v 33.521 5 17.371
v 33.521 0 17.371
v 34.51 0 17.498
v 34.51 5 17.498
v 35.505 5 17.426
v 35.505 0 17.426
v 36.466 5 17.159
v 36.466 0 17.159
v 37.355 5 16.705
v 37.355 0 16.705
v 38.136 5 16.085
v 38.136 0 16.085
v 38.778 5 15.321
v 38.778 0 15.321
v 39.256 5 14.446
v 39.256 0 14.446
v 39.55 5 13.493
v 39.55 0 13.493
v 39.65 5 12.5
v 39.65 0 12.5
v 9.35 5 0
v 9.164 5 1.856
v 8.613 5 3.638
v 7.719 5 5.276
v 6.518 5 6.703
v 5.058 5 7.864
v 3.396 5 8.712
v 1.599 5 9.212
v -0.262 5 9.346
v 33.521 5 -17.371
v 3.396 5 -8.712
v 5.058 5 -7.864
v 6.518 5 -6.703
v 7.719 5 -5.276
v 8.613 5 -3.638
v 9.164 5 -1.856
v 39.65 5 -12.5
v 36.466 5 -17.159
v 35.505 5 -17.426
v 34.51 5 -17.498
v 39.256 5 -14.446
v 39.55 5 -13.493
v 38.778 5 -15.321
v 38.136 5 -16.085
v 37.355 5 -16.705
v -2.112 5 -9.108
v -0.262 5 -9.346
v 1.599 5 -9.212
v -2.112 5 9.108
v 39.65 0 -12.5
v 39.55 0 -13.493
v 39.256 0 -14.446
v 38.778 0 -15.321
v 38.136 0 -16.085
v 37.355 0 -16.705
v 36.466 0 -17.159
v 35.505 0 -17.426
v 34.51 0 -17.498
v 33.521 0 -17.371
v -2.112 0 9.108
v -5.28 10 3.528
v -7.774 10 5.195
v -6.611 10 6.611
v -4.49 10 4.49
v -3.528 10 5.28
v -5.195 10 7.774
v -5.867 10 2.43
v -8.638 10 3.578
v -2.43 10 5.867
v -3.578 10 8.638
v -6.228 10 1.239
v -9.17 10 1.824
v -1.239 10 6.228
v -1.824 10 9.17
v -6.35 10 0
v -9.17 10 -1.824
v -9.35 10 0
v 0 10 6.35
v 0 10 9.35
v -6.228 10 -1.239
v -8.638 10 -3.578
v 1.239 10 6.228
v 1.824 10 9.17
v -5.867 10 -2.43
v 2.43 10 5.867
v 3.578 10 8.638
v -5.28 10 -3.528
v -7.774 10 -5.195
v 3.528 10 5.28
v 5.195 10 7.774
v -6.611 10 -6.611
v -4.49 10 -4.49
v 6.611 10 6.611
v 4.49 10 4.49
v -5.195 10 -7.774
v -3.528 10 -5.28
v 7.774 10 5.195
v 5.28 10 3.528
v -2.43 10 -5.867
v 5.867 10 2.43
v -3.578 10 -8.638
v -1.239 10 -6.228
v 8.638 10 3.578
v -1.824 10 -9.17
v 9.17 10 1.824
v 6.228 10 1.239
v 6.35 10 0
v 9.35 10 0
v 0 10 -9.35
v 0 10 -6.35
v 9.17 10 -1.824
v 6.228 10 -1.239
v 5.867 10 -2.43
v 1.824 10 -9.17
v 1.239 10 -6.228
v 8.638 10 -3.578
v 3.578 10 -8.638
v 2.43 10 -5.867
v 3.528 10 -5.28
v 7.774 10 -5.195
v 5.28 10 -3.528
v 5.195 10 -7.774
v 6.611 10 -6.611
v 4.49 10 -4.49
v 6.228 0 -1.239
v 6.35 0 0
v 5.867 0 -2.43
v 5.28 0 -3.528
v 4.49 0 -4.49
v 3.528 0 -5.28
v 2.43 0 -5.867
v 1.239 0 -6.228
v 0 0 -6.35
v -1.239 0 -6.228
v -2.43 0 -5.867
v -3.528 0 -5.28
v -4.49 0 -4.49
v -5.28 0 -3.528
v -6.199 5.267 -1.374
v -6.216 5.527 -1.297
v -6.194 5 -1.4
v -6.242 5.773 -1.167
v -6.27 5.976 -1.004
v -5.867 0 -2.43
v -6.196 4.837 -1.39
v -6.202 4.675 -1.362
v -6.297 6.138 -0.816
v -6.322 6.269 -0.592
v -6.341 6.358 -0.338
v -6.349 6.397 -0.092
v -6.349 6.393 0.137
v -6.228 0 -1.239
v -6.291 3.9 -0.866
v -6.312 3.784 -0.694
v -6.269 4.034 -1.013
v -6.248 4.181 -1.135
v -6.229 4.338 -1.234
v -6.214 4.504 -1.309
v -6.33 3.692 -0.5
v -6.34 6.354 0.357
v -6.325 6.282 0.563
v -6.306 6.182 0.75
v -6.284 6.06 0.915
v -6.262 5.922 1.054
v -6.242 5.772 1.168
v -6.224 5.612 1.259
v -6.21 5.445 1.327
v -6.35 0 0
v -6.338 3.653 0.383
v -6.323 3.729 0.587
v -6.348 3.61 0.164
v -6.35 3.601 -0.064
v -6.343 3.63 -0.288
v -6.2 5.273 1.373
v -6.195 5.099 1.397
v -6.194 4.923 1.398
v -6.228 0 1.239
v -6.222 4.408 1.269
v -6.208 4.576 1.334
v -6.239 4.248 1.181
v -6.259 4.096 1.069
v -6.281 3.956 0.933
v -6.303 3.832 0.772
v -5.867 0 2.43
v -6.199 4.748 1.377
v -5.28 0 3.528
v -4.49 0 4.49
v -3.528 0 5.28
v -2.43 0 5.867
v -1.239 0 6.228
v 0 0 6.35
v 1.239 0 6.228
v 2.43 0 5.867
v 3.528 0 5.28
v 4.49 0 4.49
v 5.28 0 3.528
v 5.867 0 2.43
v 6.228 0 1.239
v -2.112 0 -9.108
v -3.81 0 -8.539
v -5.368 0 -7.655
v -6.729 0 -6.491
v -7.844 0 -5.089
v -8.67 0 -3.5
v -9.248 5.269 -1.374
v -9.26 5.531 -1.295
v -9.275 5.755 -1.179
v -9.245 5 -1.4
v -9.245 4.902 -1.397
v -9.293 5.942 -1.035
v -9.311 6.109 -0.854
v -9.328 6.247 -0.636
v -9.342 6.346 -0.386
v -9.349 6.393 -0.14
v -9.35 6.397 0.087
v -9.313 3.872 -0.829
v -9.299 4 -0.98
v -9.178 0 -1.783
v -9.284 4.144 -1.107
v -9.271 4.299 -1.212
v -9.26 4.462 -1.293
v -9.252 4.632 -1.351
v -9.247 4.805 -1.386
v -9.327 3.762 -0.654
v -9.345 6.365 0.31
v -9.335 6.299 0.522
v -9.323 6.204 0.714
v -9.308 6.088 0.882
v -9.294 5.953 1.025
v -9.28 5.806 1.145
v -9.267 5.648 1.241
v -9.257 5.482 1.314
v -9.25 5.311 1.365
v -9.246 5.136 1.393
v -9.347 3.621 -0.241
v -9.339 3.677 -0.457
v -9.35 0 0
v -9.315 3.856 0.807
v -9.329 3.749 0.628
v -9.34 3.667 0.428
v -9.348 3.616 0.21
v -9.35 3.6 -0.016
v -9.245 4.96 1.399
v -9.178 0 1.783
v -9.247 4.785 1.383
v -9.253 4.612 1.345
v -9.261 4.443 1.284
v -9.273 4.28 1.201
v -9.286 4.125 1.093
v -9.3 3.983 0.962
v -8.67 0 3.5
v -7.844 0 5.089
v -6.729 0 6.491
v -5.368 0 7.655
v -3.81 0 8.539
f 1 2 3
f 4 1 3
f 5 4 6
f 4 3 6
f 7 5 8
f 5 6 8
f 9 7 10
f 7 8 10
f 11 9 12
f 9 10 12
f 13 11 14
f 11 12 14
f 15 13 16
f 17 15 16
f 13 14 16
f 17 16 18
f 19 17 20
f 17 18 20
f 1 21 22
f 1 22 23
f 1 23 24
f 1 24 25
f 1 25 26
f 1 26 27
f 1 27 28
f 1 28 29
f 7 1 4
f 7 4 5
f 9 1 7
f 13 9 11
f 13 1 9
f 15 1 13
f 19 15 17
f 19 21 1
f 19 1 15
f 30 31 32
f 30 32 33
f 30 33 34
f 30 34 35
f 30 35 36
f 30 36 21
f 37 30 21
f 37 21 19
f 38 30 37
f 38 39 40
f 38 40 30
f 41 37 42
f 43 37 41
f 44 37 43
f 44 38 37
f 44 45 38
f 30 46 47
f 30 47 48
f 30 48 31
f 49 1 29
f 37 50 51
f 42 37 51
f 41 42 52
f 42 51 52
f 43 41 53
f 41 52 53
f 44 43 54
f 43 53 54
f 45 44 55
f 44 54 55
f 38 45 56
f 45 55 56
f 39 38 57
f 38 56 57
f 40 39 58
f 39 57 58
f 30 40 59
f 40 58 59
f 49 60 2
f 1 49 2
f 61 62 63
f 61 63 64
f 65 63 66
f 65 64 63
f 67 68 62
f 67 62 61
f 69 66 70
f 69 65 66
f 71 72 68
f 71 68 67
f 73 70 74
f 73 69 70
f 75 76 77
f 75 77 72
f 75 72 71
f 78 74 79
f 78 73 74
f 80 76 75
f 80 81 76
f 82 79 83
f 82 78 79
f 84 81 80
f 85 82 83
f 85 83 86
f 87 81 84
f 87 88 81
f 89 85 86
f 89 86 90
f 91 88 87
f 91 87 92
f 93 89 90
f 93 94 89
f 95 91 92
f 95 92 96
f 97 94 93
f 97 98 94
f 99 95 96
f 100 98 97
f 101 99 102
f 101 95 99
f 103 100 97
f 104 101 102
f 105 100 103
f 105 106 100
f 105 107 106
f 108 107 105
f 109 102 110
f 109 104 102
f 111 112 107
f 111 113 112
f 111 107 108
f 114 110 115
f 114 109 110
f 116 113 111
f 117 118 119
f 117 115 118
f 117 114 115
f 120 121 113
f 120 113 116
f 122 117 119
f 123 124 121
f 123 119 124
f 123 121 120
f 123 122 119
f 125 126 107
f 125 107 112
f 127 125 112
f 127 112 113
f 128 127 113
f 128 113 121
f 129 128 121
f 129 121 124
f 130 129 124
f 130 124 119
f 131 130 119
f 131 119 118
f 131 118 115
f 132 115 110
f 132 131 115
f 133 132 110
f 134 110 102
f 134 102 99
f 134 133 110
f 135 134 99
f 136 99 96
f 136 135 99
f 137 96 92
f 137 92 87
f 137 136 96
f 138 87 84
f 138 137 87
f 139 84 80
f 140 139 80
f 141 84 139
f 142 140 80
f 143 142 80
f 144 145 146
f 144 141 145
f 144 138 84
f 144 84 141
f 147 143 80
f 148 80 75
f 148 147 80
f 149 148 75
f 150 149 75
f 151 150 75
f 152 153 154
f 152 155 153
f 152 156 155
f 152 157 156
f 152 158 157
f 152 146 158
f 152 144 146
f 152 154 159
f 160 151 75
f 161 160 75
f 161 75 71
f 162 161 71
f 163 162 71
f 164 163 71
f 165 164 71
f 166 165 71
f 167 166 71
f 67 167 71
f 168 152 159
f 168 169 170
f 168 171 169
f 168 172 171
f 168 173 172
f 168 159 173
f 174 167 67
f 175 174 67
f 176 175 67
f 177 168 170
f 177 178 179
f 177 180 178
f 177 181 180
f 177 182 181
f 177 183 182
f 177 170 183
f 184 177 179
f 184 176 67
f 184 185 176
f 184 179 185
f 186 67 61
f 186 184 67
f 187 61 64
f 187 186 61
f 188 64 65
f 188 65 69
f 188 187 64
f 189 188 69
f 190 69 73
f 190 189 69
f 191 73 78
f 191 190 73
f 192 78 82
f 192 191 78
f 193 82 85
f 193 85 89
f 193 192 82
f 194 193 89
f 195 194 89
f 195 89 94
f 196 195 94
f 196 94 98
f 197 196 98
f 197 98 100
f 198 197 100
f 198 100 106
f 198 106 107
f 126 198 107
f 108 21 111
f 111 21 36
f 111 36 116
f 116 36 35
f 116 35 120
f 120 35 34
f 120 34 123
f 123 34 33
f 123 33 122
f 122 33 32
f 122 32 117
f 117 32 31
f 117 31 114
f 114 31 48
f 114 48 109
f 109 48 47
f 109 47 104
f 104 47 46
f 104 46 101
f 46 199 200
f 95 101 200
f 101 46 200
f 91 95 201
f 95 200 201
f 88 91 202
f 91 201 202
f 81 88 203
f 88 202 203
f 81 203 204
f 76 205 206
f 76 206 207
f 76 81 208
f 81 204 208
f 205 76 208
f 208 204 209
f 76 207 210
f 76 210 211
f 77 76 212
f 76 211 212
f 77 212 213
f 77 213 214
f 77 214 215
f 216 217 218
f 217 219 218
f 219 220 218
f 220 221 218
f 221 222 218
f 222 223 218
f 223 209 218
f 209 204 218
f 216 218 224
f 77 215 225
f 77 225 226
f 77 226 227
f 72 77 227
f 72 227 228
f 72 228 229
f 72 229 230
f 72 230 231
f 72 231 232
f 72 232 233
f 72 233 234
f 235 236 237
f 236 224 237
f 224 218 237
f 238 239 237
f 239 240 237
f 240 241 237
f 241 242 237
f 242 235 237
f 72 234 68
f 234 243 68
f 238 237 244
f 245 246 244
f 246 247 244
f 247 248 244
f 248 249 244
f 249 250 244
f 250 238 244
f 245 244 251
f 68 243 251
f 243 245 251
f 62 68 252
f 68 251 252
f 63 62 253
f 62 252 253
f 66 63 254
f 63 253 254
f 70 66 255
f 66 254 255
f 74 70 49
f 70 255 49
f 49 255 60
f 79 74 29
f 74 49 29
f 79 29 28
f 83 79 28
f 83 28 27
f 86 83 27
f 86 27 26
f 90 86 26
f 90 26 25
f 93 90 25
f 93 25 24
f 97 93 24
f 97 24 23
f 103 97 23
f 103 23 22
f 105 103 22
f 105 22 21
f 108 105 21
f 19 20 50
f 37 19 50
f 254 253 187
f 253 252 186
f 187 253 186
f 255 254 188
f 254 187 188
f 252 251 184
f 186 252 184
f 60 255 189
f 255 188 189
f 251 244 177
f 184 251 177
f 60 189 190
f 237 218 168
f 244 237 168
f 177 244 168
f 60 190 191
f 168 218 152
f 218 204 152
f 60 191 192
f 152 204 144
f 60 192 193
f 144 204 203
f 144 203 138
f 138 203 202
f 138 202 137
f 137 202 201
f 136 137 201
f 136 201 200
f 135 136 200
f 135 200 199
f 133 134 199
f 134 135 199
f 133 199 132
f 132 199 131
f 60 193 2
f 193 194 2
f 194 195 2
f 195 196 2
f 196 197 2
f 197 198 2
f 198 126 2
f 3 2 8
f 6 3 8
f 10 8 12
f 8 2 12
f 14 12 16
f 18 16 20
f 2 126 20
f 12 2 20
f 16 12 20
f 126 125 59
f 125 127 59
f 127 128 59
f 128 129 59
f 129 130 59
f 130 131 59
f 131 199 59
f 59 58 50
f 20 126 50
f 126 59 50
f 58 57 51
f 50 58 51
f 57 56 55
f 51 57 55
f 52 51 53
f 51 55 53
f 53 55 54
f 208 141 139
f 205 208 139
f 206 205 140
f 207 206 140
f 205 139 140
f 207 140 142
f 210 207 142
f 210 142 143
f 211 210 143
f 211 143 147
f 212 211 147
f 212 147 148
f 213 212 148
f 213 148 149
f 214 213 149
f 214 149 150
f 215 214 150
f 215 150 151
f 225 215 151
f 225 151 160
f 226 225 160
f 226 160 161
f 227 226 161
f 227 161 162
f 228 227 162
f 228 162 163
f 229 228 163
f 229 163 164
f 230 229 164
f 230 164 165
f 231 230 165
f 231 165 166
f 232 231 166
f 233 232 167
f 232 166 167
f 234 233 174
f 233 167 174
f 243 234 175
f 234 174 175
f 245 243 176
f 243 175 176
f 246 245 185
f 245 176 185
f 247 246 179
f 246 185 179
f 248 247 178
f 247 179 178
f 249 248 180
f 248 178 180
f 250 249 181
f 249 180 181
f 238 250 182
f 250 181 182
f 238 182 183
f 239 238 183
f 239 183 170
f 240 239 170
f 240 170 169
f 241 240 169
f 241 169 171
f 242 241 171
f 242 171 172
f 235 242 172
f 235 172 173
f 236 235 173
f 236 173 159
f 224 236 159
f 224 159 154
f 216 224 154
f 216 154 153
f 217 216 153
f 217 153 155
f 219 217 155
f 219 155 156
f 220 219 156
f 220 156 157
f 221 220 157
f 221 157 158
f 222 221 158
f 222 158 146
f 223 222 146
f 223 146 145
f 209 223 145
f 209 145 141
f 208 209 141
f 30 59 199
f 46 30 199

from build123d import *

# Parameters (mm, degrees)
SKETCH1_R           = 6.35
BOSS_EXTRUDE1_DEPTH = 5
SKETCH1_3_R         = 6.35
BOSS_EXTRUDE2_DEPTH = 10
SKETCH2_R           = 1.4
CUT_EXTRUDE1_DEPTH  = 45.478899492


with BuildPart() as part:
    # Sketch1 → Boss-Extrude1 (new body)
    with BuildSketch(Plane(origin=(0, 0, 0), x_dir=(1, 0, 0), z_dir=(0, 1, 0))):
        with BuildLine():
            Line((33.520573743, 17.370769583), (-2.1120271, 9.10833912))
            ThreePointArc((-2.1120271, 9.10833912), (-9.35, 0), (-2.1120271, -9.10833912))
            Line((-2.1120271, -9.10833912), (33.520573743, -17.370769583))
            ThreePointArc((33.520573743, -17.370769583), (37.760696764, -16.414532621), (39.65, -12.5))
            Line((39.65, -12.5), (39.65, 12.5))
            ThreePointArc((39.65, 12.5), (37.760696764, 16.414532621), (33.520573743, 17.370769583))
        make_face()
        Circle(SKETCH1_R, mode=Mode.SUBTRACT)
    extrude(amount=BOSS_EXTRUDE1_DEPTH)

    # Sketch1<3> → Boss-Extrude2 (add)
    with BuildSketch(Plane(origin=(0, 0, 0), x_dir=(1, 0, 0), z_dir=(0, 1, 0))):
        with BuildLine():
            ThreePointArc((9.35, 0), (5.817002949, 7.320176001), (-2.1120271, 9.10833912))
            ThreePointArc((-2.1120271, 9.10833912), (-9.35, 0), (-2.1120271, -9.10833912))
            ThreePointArc((-2.1120271, -9.10833912), (5.817002949, -7.320176001), (9.35, 0))
        make_face()
        Circle(SKETCH1_3_R, mode=Mode.SUBTRACT)
    extrude(amount=BOSS_EXTRUDE2_DEPTH)

    # Sketch2 → Cut-Extrude1 (cut, through all)
    with BuildSketch(Plane(origin=(0, 0, 0), x_dir=(0, 0, -1), z_dir=(1, 0, 0))):
        with Locations((0, 5)):
            Circle(SKETCH2_R)
    extrude(amount=-CUT_EXTRUDE1_DEPTH, mode=Mode.SUBTRACT)


solid = part.part
